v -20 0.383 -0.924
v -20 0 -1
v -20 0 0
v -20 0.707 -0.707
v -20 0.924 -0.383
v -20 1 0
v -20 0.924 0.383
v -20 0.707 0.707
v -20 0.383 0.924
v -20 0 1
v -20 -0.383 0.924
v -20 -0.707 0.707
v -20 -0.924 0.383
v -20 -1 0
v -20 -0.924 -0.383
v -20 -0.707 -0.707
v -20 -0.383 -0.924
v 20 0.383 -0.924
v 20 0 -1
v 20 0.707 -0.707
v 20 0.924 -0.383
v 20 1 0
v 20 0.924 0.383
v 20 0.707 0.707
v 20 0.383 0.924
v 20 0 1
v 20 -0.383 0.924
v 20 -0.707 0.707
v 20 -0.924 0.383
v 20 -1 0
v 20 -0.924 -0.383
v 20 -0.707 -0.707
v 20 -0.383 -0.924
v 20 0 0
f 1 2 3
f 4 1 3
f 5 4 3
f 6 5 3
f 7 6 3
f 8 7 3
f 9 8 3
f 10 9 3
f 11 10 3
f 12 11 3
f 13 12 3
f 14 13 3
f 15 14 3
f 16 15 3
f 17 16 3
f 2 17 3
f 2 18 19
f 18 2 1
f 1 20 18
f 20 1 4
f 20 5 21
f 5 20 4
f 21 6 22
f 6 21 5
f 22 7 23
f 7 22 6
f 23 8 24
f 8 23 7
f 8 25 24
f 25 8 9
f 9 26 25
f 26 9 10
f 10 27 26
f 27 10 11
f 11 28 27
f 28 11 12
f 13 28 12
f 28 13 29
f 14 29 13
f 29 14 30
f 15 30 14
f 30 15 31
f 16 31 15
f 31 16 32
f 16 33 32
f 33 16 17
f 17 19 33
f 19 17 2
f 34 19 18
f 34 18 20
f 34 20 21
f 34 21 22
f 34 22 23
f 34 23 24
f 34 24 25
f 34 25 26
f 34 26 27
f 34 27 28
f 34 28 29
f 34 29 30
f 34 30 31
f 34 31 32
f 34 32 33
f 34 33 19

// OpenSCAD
// file: ../p/4-4edge.scad
use <../lib.scad>
function ldraw_lib__4_4edge() = [
// 0 Circle 1.0
// 0 Name: 4-4edge.dat
// 0 Author: James Jessiman
// 0 !LDRAW_ORG Primitive UPDATE 2017-01
// 0 !LICENSE Licensed under CC BY 2.0 and CC BY 4.0 : see CAreadme.txt
// 
// 0 BFC CERTIFY CCW
  [0,"BFC","CERTIFY"],
  [0,"BFC","CCW"],
// 
// 0 !HISTORY 1998-12-15 [PTadmin] Official Update 1998-10
// 0 !HISTORY 2005-12-28 [PTadmin] Official Update 2005-01
// 0 !HISTORY 2007-06-24 [PTadmin] Header formatted for Contributor Agreement
// 0 !HISTORY 2008-07-01 [PTadmin] Official Update 2008-01
// 0 !HISTORY 2017-01-15 [Steffen] BFCed
// 0 !HISTORY 2017-12-30 [PTadmin] Official Update 2017-01
// 
// 
// 2 24 1 0 0 0.9239 0 0.3827
  [2,24,1,0,0,0.9239,0,0.3827],
// 2 24 0.9239 0 0.3827 0.7071 0 0.7071
  [2,24,0.9239,0,0.3827,0.7071,0,0.7071],
// 2 24 0.7071 0 0.7071 0.3827 0 0.9239
  [2,24,0.7071,0,0.7071,0.3827,0,0.9239],
// 2 24 0.3827 0 0.9239 0 0 1
  [2,24,0.3827,0,0.9239,0,0,1],
// 2 24 0 0 1 -0.3827 0 0.9239
  [2,24,0,0,1,-0.3827,0,0.9239],
// 2 24 -0.3827 0 0.9239 -0.7071 0 0.7071
  [2,24,-0.3827,0,0.9239,-0.7071,0,0.7071],
// 2 24 -0.7071 0 0.7071 -0.9239 0 0.3827
  [2,24,-0.7071,0,0.7071,-0.9239,0,0.3827],
// 2 24 -0.9239 0 0.3827 -1 0 -0
  [2,24,-0.9239,0,0.3827,-1,0,-0],
// 2 24 -1 0 -0 -0.9239 0 -0.3827
  [2,24,-1,0,-0,-0.9239,0,-0.3827],
// 2 24 -0.9239 0 -0.3827 -0.7071 0 -0.7071
  [2,24,-0.9239,0,-0.3827,-0.7071,0,-0.7071],
// 2 24 -0.7071 0 -0.7071 -0.3827 0 -0.9239
  [2,24,-0.7071,0,-0.7071,-0.3827,0,-0.9239],
// 2 24 -0.3827 0 -0.9239 0 0 -1
  [2,24,-0.3827,0,-0.9239,0,0,-1],
// 2 24 0 0 -1 0.3827 0 -0.9239
  [2,24,0,0,-1,0.3827,0,-0.9239],
// 2 24 0.3827 0 -0.9239 0.7071 0 -0.7071
  [2,24,0.3827,0,-0.9239,0.7071,0,-0.7071],
// 2 24 0.7071 0 -0.7071 0.9239 0 -0.3827
  [2,24,0.7071,0,-0.7071,0.9239,0,-0.3827],
// 2 24 0.9239 0 -0.3827 1 0 0
  [2,24,0.9239,0,-0.3827,1,0,0],
];
module ldraw_lib__4_4edge(step=0, col=false, unit=2/5, alt=false, line=0.2, solid=!$preview)
    makepoly(ldraw_lib__4_4edge(), step=step, col=col, unit=unit, alt=alt, line=line, solid=solid);
ldraw_lib__4_4edge(line=0.2);
// file: ../p/4-4cyli.scad
use <../lib.scad>
function ldraw_lib__4_4cyli() = [
// 0 Cylinder 1.0
// 0 Name: 4-4cyli.dat
// 0 Author: James Jessiman
// 0 !LDRAW_ORG Primitive UPDATE 2005-01
// 0 !LICENSE Licensed under CC BY 2.0 and CC BY 4.0 : see CAreadme.txt
// 
// 0 BFC CERTIFY CCW
  [0,"BFC","CERTIFY"],
  [0,"BFC","CCW"],
// 
// 0 !HISTORY 1998-12-15 [PTadmin] Official Update 1998-10
// 0 !HISTORY 2002-03-23 [sbliss] Added BFC statement; merged headers from files in distributions LDraw 0.27 and Complete.
// 0 !HISTORY 2002-04-25 [PTadmin] Official Update 2002-02
// 0 !HISTORY 2004-12-14 [guyvivan] BFC CCW
// 0 !HISTORY 2005-12-28 [PTadmin] Official Update 2005-01
// 0 !HISTORY 2007-06-24 [PTadmin] Header formatted for Contributor Agreement
// 0 !HISTORY 2008-07-01 [PTadmin] Official Update 2008-01
// 
// 
// 4 16 1 1 0 0.9239 1 0.3827 0.9239 0 0.3827 1 0 0
  [4,16,1,1,0,0.9239,1,0.3827,0.9239,0,0.3827,1,0,0],
// 5 24 1 0 0 1 1 0 0.9239 0 0.3827 0.9239 0 -0.3827
  [5,24,1,0,0,1,1,0,0.9239,0,0.3827,0.9239,0,-0.3827],
// 4 16 0.9239 1 0.3827 0.7071 1 0.7071 0.7071 0 0.7071 0.9239 0 0.3827
  [4,16,0.9239,1,0.3827,0.7071,1,0.7071,0.7071,0,0.7071,0.9239,0,0.3827],
// 5 24 0.9239 0 0.3827 0.9239 1 0.3827 0.7071 0 0.7071 1 0 0
  [5,24,0.9239,0,0.3827,0.9239,1,0.3827,0.7071,0,0.7071,1,0,0],
// 4 16 0.7071 1 0.7071 0.3827 1 0.9239 0.3827 0 0.9239 0.7071 0 0.7071
  [4,16,0.7071,1,0.7071,0.3827,1,0.9239,0.3827,0,0.9239,0.7071,0,0.7071],
// 5 24 0.7071 0 0.7071 0.7071 1 0.7071 0.3827 0 0.9239 0.9239 0 0.3827
  [5,24,0.7071,0,0.7071,0.7071,1,0.7071,0.3827,0,0.9239,0.9239,0,0.3827],
// 4 16 0.3827 1 0.9239 0 1 1 0 0 1 0.3827 0 0.9239
  [4,16,0.3827,1,0.9239,0,1,1,0,0,1,0.3827,0,0.9239],
// 5 24 0.3827 0 0.9239 0.3827 1 0.9239 0 0 1 0.7071 0 0.7071
  [5,24,0.3827,0,0.9239,0.3827,1,0.9239,0,0,1,0.7071,0,0.7071],
// 4 16 0 1 1 -0.3827 1 0.9239 -0.3827 0 0.9239 0 0 1
  [4,16,0,1,1,-0.3827,1,0.9239,-0.3827,0,0.9239,0,0,1],
// 5 24 0 0 1 0 1 1 -0.3827 0 0.9239 0.3827 0 0.9239
  [5,24,0,0,1,0,1,1,-0.3827,0,0.9239,0.3827,0,0.9239],
// 4 16 -0.3827 1 0.9239 -0.7071 1 0.7071 -0.7071 0 0.7071 -0.3827 0 0.9239
  [4,16,-0.3827,1,0.9239,-0.7071,1,0.7071,-0.7071,0,0.7071,-0.3827,0,0.9239],
// 5 24 -0.3827 0 0.9239 -0.3827 1 0.9239 -0.7071 0 0.7071 0 0 1
  [5,24,-0.3827,0,0.9239,-0.3827,1,0.9239,-0.7071,0,0.7071,0,0,1],
// 4 16 -0.7071 1 0.7071 -0.9239 1 0.3827 -0.9239 0 0.3827 -0.7071 0 0.7071
  [4,16,-0.7071,1,0.7071,-0.9239,1,0.3827,-0.9239,0,0.3827,-0.7071,0,0.7071],
// 5 24 -0.7071 0 0.7071 -0.7071 1 0.7071 -0.9239 0 0.3827 -0.3827 0 0.9239
  [5,24,-0.7071,0,0.7071,-0.7071,1,0.7071,-0.9239,0,0.3827,-0.3827,0,0.9239],
// 4 16 -0.9239 1 0.3827 -1 1 0 -1 0 0 -0.9239 0 0.3827
  [4,16,-0.9239,1,0.3827,-1,1,0,-1,0,0,-0.9239,0,0.3827],
// 5 24 -0.9239 0 0.3827 -0.9239 1 0.3827 -1 0 0 -0.7071 0 0.7071
  [5,24,-0.9239,0,0.3827,-0.9239,1,0.3827,-1,0,0,-0.7071,0,0.7071],
// 4 16 -1 1 0 -0.9239 1 -0.3827 -0.9239 0 -0.3827 -1 0 0
  [4,16,-1,1,0,-0.9239,1,-0.3827,-0.9239,0,-0.3827,-1,0,0],
// 5 24 -1 0 0 -1 1 0 -0.9239 0 -0.3827 -0.9239 0 0.3827
  [5,24,-1,0,0,-1,1,0,-0.9239,0,-0.3827,-0.9239,0,0.3827],
// 4 16 -0.9239 1 -0.3827 -0.7071 1 -0.7071 -0.7071 0 -0.7071 -0.9239 0 -0.3827
  [4,16,-0.9239,1,-0.3827,-0.7071,1,-0.7071,-0.7071,0,-0.7071,-0.9239,0,-0.3827],
// 5 24 -0.9239 0 -0.3827 -0.9239 1 -0.3827 -0.7071 0 -0.7071 -1 0 0
  [5,24,-0.9239,0,-0.3827,-0.9239,1,-0.3827,-0.7071,0,-0.7071,-1,0,0],
// 4 16 -0.7071 1 -0.7071 -0.3827 1 -0.9239 -0.3827 0 -0.9239 -0.7071 0 -0.7071
  [4,16,-0.7071,1,-0.7071,-0.3827,1,-0.9239,-0.3827,0,-0.9239,-0.7071,0,-0.7071],
// 5 24 -0.7071 0 -0.7071 -0.7071 1 -0.7071 -0.3827 0 -0.9239 -0.9239 0 -0.3827
  [5,24,-0.7071,0,-0.7071,-0.7071,1,-0.7071,-0.3827,0,-0.9239,-0.9239,0,-0.3827],
// 4 16 -0.3827 1 -0.9239 0 1 -1 0 0 -1 -0.3827 0 -0.9239
  [4,16,-0.3827,1,-0.9239,0,1,-1,0,0,-1,-0.3827,0,-0.9239],
// 5 24 -0.3827 0 -0.9239 -0.3827 1 -0.9239 0 0 -1 -0.7071 0 -0.7071
  [5,24,-0.3827,0,-0.9239,-0.3827,1,-0.9239,0,0,-1,-0.7071,0,-0.7071],
// 4 16 0 1 -1 0.3827 1 -0.9239 0.3827 0 -0.9239 0 0 -1
  [4,16,0,1,-1,0.3827,1,-0.9239,0.3827,0,-0.9239,0,0,-1],
// 5 24 0 0 -1 0 1 -1 0.3827 0 -0.9239 -0.3827 0 -0.9239
  [5,24,0,0,-1,0,1,-1,0.3827,0,-0.9239,-0.3827,0,-0.9239],
// 4 16 0.3827 1 -0.9239 0.7071 1 -0.7071 0.7071 0 -0.7071 0.3827 0 -0.9239
  [4,16,0.3827,1,-0.9239,0.7071,1,-0.7071,0.7071,0,-0.7071,0.3827,0,-0.9239],
// 5 24 0.3827 0 -0.9239 0.3827 1 -0.9239 0.7071 0 -0.7071 0 0 -1
  [5,24,0.3827,0,-0.9239,0.3827,1,-0.9239,0.7071,0,-0.7071,0,0,-1],
// 4 16 0.7071 1 -0.7071 0.9239 1 -0.3827 0.9239 0 -0.3827 0.7071 0 -0.7071
  [4,16,0.7071,1,-0.7071,0.9239,1,-0.3827,0.9239,0,-0.3827,0.7071,0,-0.7071],
// 5 24 0.7071 0 -0.7071 0.7071 1 -0.7071 0.9239 0 -0.3827 0.3827 0 -0.9239
  [5,24,0.7071,0,-0.7071,0.7071,1,-0.7071,0.9239,0,-0.3827,0.3827,0,-0.9239],
// 4 16 0.9239 1 -0.3827 1 1 0 1 0 0 0.9239 0 -0.3827
  [4,16,0.9239,1,-0.3827,1,1,0,1,0,0,0.9239,0,-0.3827],
// 5 24 0.9239 0 -0.3827 0.9239 1 -0.3827 1 0 0 0.7071 0 -0.7071
  [5,24,0.9239,0,-0.3827,0.9239,1,-0.3827,1,0,0,0.7071,0,-0.7071],
// 0
];
module ldraw_lib__4_4cyli(step=0, col=false, unit=2/5, alt=false, line=0.2, solid=!$preview)
    makepoly(ldraw_lib__4_4cyli(), step=step, col=col, unit=unit, alt=alt, line=line, solid=solid);
ldraw_lib__4_4cyli(line=0.2);
// file: ../p/4-4disc.scad
use <../lib.scad>
function ldraw_lib__4_4disc() = [
// 0 Disc 1.0
// 0 Name: 4-4disc.dat
// 0 Author: James Jessiman
// 0 !LDRAW_ORG Primitive UPDATE 2002-02
// 0 !LICENSE Licensed under CC BY 2.0 and CC BY 4.0 : see CAreadme.txt
// 
// 0 BFC CERTIFY CCW
  [0,"BFC","CERTIFY"],
  [0,"BFC","CCW"],
// 
// 0 !HISTORY 1998-12-15 [PTadmin] Official Update 1998-10
// 0 !HISTORY 2002-03-23 [sbliss] Added BFC statement
// 0 !HISTORY 2002-04-25 [PTadmin] Official Update 2002-02
// 0 !HISTORY 2007-06-24 [PTadmin] Header formatted for Contributor Agreement
// 0 !HISTORY 2008-07-01 [PTadmin] Official Update 2008-01
// 
// 
// 3 16 0 0 0 1 0 0 0.9239 0 0.3827
  [3,16,0,0,0,1,0,0,0.9239,0,0.3827],
// 3 16 0 0 0 0.9239 0 0.3827 0.7071 0 0.7071
  [3,16,0,0,0,0.9239,0,0.3827,0.7071,0,0.7071],
// 3 16 0 0 0 0.7071 0 0.7071 0.3827 0 0.9239
  [3,16,0,0,0,0.7071,0,0.7071,0.3827,0,0.9239],
// 3 16 0 0 0 0.3827 0 0.9239 0 0 1
  [3,16,0,0,0,0.3827,0,0.9239,0,0,1],
// 3 16 0 0 0 0 0 1 -0.3827 0 0.9239
  [3,16,0,0,0,0,0,1,-0.3827,0,0.9239],
// 3 16 0 0 0 -0.3827 0 0.9239 -0.7071 0 0.7071
  [3,16,0,0,0,-0.3827,0,0.9239,-0.7071,0,0.7071],
// 3 16 0 0 0 -0.7071 0 0.7071 -0.9239 0 0.3827
  [3,16,0,0,0,-0.7071,0,0.7071,-0.9239,0,0.3827],
// 3 16 0 0 0 -0.9239 0 0.3827 -1 0 -0
  [3,16,0,0,0,-0.9239,0,0.3827,-1,0,-0],
// 3 16 0 0 0 -1 0 -0 -0.9239 0 -0.3827
  [3,16,0,0,0,-1,0,-0,-0.9239,0,-0.3827],
// 3 16 0 0 0 -0.9239 0 -0.3827 -0.7071 0 -0.7071
  [3,16,0,0,0,-0.9239,0,-0.3827,-0.7071,0,-0.7071],
// 3 16 0 0 0 -0.7071 0 -0.7071 -0.3827 0 -0.9239
  [3,16,0,0,0,-0.7071,0,-0.7071,-0.3827,0,-0.9239],
// 3 16 0 0 0 -0.3827 0 -0.9239 0 0 -1
  [3,16,0,0,0,-0.3827,0,-0.9239,0,0,-1],
// 3 16 0 0 0 0 0 -1 0.3827 0 -0.9239
  [3,16,0,0,0,0,0,-1,0.3827,0,-0.9239],
// 3 16 0 0 0 0.3827 0 -0.9239 0.7071 0 -0.7071
  [3,16,0,0,0,0.3827,0,-0.9239,0.7071,0,-0.7071],
// 3 16 0 0 0 0.7071 0 -0.7071 0.9239 0 -0.3827
  [3,16,0,0,0,0.7071,0,-0.7071,0.9239,0,-0.3827],
// 3 16 0 0 0 0.9239 0 -0.3827 1 0 0
  [3,16,0,0,0,0.9239,0,-0.3827,1,0,0],
// 0
];
module ldraw_lib__4_4disc(step=0, col=false, unit=2/5, alt=false, line=0.2, solid=!$preview)
    makepoly(ldraw_lib__4_4disc(), step=step, col=col, unit=unit, alt=alt, line=line, solid=solid);
ldraw_lib__4_4disc(line=0.2);
// file: ../p/4-4cylc.scad
use <../lib.scad>
use <4-4cyli.scad>
use <4-4disc.scad>
use <4-4edge.scad>
function ldraw_lib__4_4cylc() = [
// 0 Cylinder Closed 1.0
// 0 Name: 4-4cylc.dat
// 0 Author: Alex Taylor [anathema]
// 0 !LDRAW_ORG Primitive UPDATE 2009-02
// 0 !LICENSE Licensed under CC BY 2.0 and CC BY 4.0 : see CAreadme.txt
// 
// 0 BFC CERTIFY CCW
  [0,"BFC","CERTIFY"],
  [0,"BFC","CCW"],
// 
// 0 !HISTORY 2008-12-29 [cwdee] Removed one disc
// 0 !HISTORY 2009-09-03 [PTadmin] Official Update 2009-02
// 
// 
// 1 16 0 0 0 1 0 0 0 1 0 0 0 1 4-4edge.dat
  [1,16,0,0,0,1,0,0,0,1,0,0,0,1, ldraw_lib__4_4edge()],
// 1 16 0 1 0 1 0 0 0 1 0 0 0 1 4-4edge.dat
  [1,16,0,1,0,1,0,0,0,1,0,0,0,1, ldraw_lib__4_4edge()],
// 1 16 0 0 0 1 0 0 0 1 0 0 0 1 4-4disc.dat
  [1,16,0,0,0,1,0,0,0,1,0,0,0,1, ldraw_lib__4_4disc()],
// 1 16 0 0 0 1 0 0 0 1 0 0 0 1 4-4cyli.dat
  [1,16,0,0,0,1,0,0,0,1,0,0,0,1, ldraw_lib__4_4cyli()],
// 0
];
module ldraw_lib__4_4cylc(step=0, col=false, unit=2/5, alt=false, line=0.2, solid=!$preview)
    makepoly(ldraw_lib__4_4cylc(), step=step, col=col, unit=unit, alt=alt, line=line, solid=solid);
ldraw_lib__4_4cylc(line=0.2);
// main file
use <../lib.scad>
use <../p/4-4cylc.scad>
use <../p/4-4disc.scad>
function ldraw_lib__57877() = [
// 0 ~Axle Steel  5 x 100 LDU
// 0 Name: 57877.dat
// 0 Author: Max Martin Richter [MMR1988]
// 0 !LDRAW_ORG Part UPDATE 2017-01
// 0 !LICENSE Licensed under CC BY 2.0 and CC BY 4.0 : see CAreadme.txt
// 
// 0 BFC CERTIFY CCW
  [0,"BFC","CERTIFY"],
  [0,"BFC","CCW"],
// 
// 0 !CATEGORY Wheel
// 
// 0 !HISTORY 2013-12-23 [PTadmin] Official Update 2013-02
// 0 !HISTORY 2017-01-01 [cwdee] Update description
// 0 !HISTORY 2017-12-30 [PTadmin] Official Update 2017-01
// 
// 
// 1 16 -50 0 0 0 100 0 2.5 0 0 0 0 2.5 4-4cylc.dat
  [1,16,-50,0,0,0,100,0,2.5,0,0,0,0,2.5, ldraw_lib__4_4cylc()],
// 1 16 50 0 0 0 -1 0 2.5 0 0 0 0 2.5 4-4disc.dat
  [1,16,50,0,0,0,-1,0,2.5,0,0,0,0,2.5, ldraw_lib__4_4disc()],
];
module ldraw_lib__57877(step=0, col=false, unit=2/5, alt=false, line=0.2, solid=!$preview)
    makepoly(ldraw_lib__57877(), step=step, col=col, unit=unit, alt=alt, line=line, solid=solid);
ldraw_lib__57877(line=0.2);
